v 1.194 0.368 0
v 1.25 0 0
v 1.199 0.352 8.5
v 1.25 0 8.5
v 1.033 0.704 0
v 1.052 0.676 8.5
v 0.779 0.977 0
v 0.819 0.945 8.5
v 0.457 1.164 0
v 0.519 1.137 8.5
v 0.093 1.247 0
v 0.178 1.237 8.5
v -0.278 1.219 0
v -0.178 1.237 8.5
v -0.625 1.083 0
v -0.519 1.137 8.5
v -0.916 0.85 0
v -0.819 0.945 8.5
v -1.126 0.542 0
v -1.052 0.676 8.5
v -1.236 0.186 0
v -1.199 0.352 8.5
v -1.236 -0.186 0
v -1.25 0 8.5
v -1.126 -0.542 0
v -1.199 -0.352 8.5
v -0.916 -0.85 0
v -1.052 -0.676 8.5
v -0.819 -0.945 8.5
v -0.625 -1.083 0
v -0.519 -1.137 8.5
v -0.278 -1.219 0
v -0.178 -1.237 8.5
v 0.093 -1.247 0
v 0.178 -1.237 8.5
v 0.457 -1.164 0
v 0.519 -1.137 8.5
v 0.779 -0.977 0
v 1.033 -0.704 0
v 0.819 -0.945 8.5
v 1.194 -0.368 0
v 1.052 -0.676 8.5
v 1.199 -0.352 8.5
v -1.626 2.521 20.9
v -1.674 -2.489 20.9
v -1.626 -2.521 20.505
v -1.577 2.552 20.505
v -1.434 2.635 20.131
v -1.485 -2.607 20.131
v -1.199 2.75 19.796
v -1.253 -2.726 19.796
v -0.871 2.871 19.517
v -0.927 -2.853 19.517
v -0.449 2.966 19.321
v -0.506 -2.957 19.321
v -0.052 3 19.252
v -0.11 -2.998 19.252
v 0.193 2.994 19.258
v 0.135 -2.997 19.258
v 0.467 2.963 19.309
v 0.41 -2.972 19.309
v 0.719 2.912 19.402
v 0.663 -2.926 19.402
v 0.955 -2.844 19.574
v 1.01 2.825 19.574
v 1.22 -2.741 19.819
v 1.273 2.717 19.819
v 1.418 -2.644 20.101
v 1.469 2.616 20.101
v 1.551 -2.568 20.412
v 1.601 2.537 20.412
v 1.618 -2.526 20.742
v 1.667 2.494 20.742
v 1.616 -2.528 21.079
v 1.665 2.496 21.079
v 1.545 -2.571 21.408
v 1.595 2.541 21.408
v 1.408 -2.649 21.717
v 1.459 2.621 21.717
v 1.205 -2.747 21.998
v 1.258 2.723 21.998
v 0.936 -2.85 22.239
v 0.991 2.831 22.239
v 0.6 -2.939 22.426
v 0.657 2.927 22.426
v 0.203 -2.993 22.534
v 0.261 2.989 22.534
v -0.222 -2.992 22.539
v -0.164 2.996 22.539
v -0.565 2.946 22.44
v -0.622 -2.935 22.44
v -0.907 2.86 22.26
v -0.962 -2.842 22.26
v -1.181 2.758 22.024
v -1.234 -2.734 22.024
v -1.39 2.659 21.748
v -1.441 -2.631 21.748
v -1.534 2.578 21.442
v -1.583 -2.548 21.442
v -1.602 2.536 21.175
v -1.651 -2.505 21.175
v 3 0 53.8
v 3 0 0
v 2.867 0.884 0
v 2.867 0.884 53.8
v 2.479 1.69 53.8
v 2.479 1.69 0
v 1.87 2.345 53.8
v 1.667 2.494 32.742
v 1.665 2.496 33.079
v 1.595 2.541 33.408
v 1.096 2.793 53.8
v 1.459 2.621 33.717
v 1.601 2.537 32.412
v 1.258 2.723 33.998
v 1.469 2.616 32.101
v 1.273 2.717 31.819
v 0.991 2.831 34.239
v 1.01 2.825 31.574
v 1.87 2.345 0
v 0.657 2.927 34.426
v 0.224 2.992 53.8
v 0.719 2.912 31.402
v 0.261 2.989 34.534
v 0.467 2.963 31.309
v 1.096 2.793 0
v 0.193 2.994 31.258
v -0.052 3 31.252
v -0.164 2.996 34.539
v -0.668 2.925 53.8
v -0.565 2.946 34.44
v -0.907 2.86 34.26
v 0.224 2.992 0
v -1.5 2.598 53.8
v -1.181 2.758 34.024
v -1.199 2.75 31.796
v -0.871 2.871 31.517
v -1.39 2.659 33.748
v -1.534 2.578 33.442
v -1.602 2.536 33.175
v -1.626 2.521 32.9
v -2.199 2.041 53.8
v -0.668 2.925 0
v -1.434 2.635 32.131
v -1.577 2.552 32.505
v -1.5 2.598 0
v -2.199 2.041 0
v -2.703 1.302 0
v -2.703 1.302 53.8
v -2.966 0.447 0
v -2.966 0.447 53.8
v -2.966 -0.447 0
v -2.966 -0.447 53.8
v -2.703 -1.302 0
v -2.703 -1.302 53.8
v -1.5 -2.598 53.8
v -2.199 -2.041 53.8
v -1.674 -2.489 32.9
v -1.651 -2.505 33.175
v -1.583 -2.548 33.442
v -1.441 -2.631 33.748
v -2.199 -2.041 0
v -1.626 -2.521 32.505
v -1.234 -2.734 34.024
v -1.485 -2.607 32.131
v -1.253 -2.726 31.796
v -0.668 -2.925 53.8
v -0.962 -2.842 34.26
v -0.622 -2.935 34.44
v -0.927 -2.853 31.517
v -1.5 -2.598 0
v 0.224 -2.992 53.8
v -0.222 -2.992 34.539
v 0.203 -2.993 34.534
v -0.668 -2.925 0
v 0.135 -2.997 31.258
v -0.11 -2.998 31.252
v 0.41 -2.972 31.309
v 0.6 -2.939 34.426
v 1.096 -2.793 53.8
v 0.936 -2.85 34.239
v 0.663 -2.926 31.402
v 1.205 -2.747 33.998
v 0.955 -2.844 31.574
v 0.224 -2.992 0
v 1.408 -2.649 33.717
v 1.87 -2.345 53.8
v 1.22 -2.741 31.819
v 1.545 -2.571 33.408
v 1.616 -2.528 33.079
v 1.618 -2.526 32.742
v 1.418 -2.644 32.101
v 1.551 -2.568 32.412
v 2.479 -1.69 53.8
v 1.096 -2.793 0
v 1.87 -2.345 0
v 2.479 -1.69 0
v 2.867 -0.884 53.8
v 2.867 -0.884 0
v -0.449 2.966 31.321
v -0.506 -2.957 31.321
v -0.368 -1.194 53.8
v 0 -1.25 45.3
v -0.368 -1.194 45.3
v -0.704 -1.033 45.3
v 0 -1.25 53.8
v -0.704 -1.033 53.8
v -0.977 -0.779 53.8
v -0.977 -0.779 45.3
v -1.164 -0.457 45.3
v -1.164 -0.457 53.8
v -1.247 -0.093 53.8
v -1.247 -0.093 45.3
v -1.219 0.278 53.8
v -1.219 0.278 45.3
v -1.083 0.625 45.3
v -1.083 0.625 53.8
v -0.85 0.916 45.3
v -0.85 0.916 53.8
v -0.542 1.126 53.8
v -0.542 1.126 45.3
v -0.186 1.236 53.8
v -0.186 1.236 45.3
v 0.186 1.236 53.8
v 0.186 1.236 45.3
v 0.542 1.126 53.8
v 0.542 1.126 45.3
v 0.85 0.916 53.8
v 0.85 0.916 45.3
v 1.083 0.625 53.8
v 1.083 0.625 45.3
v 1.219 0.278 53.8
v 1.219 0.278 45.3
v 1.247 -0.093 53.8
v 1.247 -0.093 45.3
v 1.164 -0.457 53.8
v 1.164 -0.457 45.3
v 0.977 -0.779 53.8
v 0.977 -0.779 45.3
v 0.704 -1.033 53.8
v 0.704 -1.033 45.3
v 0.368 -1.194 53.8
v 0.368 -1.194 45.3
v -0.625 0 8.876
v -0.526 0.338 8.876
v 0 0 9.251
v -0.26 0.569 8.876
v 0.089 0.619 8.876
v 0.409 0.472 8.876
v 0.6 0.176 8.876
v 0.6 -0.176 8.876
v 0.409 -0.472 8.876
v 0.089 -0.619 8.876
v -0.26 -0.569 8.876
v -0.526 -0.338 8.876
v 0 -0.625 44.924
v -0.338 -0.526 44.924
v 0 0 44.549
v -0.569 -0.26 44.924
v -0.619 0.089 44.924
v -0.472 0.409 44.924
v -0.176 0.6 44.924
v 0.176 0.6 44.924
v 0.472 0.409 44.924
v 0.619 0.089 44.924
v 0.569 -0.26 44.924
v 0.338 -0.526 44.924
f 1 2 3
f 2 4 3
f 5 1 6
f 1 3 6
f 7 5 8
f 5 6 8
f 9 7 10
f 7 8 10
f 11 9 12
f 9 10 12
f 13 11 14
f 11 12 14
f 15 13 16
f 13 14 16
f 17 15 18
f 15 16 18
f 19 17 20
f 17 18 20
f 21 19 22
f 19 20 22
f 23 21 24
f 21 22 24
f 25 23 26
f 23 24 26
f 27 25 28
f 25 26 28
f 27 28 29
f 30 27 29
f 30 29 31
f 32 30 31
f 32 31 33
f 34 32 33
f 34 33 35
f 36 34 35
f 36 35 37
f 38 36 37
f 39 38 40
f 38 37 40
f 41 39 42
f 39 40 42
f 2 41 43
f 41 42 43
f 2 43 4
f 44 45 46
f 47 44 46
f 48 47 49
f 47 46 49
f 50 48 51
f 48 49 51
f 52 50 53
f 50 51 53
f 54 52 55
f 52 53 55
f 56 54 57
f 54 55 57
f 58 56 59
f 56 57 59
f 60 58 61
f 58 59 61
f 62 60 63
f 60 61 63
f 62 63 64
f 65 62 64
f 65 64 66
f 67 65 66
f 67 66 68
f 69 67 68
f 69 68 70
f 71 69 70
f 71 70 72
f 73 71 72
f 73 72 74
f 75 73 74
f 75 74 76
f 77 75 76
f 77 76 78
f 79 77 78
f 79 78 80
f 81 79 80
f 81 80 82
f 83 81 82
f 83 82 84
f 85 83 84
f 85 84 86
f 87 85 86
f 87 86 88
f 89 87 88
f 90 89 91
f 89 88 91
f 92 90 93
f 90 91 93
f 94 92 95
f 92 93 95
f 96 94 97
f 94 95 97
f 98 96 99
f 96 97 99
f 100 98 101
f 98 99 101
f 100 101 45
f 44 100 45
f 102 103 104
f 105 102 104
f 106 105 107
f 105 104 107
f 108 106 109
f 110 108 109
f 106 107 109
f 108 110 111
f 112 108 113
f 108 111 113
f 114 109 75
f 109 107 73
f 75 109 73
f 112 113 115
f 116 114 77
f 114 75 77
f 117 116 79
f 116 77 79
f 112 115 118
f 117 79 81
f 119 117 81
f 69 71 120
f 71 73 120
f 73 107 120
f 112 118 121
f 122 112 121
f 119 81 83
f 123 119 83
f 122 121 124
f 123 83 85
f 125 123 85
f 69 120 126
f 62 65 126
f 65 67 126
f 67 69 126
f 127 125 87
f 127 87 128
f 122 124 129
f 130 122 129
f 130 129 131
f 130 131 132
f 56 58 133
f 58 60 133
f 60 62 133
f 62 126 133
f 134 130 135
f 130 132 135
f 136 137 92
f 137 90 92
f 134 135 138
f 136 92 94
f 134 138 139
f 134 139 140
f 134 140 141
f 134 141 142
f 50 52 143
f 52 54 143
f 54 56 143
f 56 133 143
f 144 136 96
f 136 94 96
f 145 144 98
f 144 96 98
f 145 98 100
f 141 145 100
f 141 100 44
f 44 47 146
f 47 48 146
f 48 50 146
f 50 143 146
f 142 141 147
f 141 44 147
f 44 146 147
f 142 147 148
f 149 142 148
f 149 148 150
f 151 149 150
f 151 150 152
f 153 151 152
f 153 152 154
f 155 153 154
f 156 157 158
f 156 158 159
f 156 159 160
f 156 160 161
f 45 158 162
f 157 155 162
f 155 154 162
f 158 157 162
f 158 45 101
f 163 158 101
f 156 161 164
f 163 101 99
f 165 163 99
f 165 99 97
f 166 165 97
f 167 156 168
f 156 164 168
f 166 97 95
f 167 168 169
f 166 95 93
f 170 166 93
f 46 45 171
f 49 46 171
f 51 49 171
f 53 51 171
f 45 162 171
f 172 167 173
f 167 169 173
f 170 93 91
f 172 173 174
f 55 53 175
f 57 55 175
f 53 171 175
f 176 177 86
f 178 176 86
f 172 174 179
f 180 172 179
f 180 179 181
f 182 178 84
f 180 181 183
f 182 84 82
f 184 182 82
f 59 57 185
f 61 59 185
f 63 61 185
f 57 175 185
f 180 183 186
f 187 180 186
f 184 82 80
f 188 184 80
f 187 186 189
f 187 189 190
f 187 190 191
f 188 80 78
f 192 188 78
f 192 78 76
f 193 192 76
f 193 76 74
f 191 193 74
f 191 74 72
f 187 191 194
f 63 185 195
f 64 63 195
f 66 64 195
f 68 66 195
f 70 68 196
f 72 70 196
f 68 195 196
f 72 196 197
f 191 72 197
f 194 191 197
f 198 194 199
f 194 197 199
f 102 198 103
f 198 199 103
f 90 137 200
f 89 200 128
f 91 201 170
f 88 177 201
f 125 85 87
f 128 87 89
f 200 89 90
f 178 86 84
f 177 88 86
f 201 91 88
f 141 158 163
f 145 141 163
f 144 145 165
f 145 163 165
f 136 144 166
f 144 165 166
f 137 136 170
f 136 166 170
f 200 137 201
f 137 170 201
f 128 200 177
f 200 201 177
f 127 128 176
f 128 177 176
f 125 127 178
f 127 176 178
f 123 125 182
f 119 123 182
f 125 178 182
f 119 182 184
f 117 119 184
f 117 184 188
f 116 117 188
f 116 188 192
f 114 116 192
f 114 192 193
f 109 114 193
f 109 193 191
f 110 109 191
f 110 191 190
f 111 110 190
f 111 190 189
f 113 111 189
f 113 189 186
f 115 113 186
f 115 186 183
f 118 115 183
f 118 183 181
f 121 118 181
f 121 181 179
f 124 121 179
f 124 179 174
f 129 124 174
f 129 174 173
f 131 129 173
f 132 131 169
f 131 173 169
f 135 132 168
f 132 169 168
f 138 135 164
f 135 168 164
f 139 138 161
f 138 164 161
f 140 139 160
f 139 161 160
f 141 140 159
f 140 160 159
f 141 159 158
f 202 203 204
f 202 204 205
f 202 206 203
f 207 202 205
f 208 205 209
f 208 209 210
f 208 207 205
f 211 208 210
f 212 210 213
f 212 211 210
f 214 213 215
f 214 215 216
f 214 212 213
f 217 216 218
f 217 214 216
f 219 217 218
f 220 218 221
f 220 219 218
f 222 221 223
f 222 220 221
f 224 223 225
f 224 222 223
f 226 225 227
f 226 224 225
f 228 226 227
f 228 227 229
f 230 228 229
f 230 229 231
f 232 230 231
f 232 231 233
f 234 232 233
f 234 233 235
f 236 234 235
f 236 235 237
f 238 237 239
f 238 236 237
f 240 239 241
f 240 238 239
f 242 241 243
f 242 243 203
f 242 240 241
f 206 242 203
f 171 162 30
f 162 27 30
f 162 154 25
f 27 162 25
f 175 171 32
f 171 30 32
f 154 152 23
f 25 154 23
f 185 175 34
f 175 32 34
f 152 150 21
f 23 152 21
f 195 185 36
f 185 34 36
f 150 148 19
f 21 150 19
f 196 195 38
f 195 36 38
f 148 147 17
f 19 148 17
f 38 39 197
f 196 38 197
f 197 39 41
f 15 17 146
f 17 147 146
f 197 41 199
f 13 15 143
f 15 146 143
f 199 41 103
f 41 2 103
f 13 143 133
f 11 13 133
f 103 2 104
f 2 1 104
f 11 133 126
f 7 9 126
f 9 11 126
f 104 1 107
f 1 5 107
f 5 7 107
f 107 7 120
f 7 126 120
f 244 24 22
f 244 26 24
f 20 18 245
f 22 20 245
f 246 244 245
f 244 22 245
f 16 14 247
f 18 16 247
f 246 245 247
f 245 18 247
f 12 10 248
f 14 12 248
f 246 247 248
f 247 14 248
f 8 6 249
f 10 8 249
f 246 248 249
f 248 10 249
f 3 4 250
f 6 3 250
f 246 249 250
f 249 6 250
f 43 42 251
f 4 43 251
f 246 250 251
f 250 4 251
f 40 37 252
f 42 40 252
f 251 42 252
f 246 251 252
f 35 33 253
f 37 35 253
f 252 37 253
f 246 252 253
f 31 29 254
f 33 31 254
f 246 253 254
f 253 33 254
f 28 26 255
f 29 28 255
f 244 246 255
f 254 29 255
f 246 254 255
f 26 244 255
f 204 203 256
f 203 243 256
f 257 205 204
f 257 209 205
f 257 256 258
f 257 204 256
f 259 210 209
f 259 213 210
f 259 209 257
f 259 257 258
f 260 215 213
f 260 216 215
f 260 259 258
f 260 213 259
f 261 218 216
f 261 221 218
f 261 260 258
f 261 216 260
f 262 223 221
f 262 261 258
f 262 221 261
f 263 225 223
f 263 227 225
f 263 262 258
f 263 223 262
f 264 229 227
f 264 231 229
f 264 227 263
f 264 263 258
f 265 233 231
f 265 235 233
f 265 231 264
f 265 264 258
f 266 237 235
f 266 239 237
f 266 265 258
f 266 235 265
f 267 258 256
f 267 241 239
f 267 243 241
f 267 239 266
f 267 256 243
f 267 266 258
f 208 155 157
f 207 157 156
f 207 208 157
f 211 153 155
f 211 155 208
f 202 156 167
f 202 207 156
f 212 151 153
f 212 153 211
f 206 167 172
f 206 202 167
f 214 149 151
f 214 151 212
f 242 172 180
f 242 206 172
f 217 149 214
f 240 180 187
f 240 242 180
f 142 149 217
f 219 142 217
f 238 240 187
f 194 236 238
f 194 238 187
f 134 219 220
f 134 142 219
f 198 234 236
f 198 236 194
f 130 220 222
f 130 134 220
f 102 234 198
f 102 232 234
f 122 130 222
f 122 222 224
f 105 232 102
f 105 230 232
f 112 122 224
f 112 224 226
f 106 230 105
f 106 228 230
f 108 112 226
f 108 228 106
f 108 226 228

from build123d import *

# Parameters (mm, degrees)
SKETCH_1_R      = 3
EXTRUDE_1_DEPTH = 53.8
M4X0_7_1_D      = 3.3
M4X0_7_1_DEPTH  = 11.5
M4X0_7_1_TIP    = 0.991420021
M3X0_5_2_D      = 2.5
M3X0_5_2_DEPTH  = 8.5
M3X0_5_2_TIP    = 0.751075774


with BuildPart() as part:
    # ｽｹｯﾁ1 → ﾎﾞｽ - 押し出し1 (new body)
    with BuildSketch(Plane.XY):
        Circle(SKETCH_1_R)
    extrude(amount=EXTRUDE_1_DEPTH)

    # M4x0.7 ねじ穴1
    with Locations(Plane(origin=(0.029051092, 2.999859336, 32.9), x_dir=(0.999953112, -0.009683697, 0), z_dir=(0.009683697, 0.999953112, 0))):
        with Locations((0, 0), (0, 12)):
            Hole(M4X0_7_1_D / 2, depth=M4X0_7_1_DEPTH)
            with Locations((0, 0, -(M4X0_7_1_DEPTH + M4X0_7_1_TIP / 2))):  # 118° drill point
                Cone(0, M4X0_7_1_D / 2, M4X0_7_1_TIP, mode=Mode.SUBTRACT)

    # ｽｹｯﾁ7 → M3x0.5 ねじ穴1 (revolve, cut)
    with BuildSketch(Plane(origin=(0, 0, 53.8), x_dir=(0, -1, 0), z_dir=(1, 0, 0))):
        Polygon((0, 0), (0, 9.251075774), (1.25, 8.5), (1.25, 0), align=None)
    revolve(axis=Axis((0, 0, 60.15), (0, 0, -1)), mode=Mode.SUBTRACT)

    # M3x0.5 ねじ穴2
    with Locations(Plane(origin=(0, 0, 0), x_dir=(-1, 0, 0), z_dir=(0, 0, -1))):
        with Locations((0, 0)):
            Hole(M3X0_5_2_D / 2, depth=M3X0_5_2_DEPTH)
            with Locations((0, 0, -(M3X0_5_2_DEPTH + M3X0_5_2_TIP / 2))):  # 118° drill point
                Cone(0, M3X0_5_2_D / 2, M3X0_5_2_TIP, mode=Mode.SUBTRACT)


solid = part.part
